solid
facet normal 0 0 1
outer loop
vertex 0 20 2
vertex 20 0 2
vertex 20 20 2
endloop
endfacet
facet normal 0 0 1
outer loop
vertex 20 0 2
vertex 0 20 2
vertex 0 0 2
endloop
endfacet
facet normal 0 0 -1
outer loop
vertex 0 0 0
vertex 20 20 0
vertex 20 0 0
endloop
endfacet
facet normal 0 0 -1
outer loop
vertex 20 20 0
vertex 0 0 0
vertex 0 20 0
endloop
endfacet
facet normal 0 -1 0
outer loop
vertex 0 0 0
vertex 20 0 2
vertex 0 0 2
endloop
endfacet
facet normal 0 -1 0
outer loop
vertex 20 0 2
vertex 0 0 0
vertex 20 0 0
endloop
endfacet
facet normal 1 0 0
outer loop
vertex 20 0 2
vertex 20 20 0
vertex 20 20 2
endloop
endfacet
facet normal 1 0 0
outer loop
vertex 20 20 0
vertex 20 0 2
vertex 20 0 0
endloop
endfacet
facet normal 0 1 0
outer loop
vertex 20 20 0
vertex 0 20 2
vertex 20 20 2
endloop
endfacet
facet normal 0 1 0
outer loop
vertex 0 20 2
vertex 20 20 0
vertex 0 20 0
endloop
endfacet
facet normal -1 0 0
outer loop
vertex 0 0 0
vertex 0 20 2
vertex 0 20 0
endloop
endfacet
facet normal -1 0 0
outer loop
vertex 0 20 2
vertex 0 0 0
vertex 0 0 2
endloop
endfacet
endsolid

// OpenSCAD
// file: bowl.scad
// common constants used across multiple files

// a carton is 211mm long.
// two next to one another are 225mm wide.
// a carton is 250mm tall.


boltd = 5;
wallr = 3;
wallx = 8;
wally = wallr;
wallz = wallr;
mainx = 204;
mainy = 80;
mainz = 211;
totx = mainx + wallx * 2;
totz = mainz + wallz * 2;
toty = mainy + wally;

towerd = 20;
towerw = 18;

bard = 3;

swatchx = 20;
swatchy = 20;
swatchz = 2;

fpanelx = (mainx - towerw) / 2;
clampr = bard / 2 + 0.2;
fpanely = mainy;
fpanelz = 7;
// main file
// swatch for filament box bowl, specialized by swatch-*.scad

include <bowl.scad>

cube([swatchx, swatchy, swatchz]);
